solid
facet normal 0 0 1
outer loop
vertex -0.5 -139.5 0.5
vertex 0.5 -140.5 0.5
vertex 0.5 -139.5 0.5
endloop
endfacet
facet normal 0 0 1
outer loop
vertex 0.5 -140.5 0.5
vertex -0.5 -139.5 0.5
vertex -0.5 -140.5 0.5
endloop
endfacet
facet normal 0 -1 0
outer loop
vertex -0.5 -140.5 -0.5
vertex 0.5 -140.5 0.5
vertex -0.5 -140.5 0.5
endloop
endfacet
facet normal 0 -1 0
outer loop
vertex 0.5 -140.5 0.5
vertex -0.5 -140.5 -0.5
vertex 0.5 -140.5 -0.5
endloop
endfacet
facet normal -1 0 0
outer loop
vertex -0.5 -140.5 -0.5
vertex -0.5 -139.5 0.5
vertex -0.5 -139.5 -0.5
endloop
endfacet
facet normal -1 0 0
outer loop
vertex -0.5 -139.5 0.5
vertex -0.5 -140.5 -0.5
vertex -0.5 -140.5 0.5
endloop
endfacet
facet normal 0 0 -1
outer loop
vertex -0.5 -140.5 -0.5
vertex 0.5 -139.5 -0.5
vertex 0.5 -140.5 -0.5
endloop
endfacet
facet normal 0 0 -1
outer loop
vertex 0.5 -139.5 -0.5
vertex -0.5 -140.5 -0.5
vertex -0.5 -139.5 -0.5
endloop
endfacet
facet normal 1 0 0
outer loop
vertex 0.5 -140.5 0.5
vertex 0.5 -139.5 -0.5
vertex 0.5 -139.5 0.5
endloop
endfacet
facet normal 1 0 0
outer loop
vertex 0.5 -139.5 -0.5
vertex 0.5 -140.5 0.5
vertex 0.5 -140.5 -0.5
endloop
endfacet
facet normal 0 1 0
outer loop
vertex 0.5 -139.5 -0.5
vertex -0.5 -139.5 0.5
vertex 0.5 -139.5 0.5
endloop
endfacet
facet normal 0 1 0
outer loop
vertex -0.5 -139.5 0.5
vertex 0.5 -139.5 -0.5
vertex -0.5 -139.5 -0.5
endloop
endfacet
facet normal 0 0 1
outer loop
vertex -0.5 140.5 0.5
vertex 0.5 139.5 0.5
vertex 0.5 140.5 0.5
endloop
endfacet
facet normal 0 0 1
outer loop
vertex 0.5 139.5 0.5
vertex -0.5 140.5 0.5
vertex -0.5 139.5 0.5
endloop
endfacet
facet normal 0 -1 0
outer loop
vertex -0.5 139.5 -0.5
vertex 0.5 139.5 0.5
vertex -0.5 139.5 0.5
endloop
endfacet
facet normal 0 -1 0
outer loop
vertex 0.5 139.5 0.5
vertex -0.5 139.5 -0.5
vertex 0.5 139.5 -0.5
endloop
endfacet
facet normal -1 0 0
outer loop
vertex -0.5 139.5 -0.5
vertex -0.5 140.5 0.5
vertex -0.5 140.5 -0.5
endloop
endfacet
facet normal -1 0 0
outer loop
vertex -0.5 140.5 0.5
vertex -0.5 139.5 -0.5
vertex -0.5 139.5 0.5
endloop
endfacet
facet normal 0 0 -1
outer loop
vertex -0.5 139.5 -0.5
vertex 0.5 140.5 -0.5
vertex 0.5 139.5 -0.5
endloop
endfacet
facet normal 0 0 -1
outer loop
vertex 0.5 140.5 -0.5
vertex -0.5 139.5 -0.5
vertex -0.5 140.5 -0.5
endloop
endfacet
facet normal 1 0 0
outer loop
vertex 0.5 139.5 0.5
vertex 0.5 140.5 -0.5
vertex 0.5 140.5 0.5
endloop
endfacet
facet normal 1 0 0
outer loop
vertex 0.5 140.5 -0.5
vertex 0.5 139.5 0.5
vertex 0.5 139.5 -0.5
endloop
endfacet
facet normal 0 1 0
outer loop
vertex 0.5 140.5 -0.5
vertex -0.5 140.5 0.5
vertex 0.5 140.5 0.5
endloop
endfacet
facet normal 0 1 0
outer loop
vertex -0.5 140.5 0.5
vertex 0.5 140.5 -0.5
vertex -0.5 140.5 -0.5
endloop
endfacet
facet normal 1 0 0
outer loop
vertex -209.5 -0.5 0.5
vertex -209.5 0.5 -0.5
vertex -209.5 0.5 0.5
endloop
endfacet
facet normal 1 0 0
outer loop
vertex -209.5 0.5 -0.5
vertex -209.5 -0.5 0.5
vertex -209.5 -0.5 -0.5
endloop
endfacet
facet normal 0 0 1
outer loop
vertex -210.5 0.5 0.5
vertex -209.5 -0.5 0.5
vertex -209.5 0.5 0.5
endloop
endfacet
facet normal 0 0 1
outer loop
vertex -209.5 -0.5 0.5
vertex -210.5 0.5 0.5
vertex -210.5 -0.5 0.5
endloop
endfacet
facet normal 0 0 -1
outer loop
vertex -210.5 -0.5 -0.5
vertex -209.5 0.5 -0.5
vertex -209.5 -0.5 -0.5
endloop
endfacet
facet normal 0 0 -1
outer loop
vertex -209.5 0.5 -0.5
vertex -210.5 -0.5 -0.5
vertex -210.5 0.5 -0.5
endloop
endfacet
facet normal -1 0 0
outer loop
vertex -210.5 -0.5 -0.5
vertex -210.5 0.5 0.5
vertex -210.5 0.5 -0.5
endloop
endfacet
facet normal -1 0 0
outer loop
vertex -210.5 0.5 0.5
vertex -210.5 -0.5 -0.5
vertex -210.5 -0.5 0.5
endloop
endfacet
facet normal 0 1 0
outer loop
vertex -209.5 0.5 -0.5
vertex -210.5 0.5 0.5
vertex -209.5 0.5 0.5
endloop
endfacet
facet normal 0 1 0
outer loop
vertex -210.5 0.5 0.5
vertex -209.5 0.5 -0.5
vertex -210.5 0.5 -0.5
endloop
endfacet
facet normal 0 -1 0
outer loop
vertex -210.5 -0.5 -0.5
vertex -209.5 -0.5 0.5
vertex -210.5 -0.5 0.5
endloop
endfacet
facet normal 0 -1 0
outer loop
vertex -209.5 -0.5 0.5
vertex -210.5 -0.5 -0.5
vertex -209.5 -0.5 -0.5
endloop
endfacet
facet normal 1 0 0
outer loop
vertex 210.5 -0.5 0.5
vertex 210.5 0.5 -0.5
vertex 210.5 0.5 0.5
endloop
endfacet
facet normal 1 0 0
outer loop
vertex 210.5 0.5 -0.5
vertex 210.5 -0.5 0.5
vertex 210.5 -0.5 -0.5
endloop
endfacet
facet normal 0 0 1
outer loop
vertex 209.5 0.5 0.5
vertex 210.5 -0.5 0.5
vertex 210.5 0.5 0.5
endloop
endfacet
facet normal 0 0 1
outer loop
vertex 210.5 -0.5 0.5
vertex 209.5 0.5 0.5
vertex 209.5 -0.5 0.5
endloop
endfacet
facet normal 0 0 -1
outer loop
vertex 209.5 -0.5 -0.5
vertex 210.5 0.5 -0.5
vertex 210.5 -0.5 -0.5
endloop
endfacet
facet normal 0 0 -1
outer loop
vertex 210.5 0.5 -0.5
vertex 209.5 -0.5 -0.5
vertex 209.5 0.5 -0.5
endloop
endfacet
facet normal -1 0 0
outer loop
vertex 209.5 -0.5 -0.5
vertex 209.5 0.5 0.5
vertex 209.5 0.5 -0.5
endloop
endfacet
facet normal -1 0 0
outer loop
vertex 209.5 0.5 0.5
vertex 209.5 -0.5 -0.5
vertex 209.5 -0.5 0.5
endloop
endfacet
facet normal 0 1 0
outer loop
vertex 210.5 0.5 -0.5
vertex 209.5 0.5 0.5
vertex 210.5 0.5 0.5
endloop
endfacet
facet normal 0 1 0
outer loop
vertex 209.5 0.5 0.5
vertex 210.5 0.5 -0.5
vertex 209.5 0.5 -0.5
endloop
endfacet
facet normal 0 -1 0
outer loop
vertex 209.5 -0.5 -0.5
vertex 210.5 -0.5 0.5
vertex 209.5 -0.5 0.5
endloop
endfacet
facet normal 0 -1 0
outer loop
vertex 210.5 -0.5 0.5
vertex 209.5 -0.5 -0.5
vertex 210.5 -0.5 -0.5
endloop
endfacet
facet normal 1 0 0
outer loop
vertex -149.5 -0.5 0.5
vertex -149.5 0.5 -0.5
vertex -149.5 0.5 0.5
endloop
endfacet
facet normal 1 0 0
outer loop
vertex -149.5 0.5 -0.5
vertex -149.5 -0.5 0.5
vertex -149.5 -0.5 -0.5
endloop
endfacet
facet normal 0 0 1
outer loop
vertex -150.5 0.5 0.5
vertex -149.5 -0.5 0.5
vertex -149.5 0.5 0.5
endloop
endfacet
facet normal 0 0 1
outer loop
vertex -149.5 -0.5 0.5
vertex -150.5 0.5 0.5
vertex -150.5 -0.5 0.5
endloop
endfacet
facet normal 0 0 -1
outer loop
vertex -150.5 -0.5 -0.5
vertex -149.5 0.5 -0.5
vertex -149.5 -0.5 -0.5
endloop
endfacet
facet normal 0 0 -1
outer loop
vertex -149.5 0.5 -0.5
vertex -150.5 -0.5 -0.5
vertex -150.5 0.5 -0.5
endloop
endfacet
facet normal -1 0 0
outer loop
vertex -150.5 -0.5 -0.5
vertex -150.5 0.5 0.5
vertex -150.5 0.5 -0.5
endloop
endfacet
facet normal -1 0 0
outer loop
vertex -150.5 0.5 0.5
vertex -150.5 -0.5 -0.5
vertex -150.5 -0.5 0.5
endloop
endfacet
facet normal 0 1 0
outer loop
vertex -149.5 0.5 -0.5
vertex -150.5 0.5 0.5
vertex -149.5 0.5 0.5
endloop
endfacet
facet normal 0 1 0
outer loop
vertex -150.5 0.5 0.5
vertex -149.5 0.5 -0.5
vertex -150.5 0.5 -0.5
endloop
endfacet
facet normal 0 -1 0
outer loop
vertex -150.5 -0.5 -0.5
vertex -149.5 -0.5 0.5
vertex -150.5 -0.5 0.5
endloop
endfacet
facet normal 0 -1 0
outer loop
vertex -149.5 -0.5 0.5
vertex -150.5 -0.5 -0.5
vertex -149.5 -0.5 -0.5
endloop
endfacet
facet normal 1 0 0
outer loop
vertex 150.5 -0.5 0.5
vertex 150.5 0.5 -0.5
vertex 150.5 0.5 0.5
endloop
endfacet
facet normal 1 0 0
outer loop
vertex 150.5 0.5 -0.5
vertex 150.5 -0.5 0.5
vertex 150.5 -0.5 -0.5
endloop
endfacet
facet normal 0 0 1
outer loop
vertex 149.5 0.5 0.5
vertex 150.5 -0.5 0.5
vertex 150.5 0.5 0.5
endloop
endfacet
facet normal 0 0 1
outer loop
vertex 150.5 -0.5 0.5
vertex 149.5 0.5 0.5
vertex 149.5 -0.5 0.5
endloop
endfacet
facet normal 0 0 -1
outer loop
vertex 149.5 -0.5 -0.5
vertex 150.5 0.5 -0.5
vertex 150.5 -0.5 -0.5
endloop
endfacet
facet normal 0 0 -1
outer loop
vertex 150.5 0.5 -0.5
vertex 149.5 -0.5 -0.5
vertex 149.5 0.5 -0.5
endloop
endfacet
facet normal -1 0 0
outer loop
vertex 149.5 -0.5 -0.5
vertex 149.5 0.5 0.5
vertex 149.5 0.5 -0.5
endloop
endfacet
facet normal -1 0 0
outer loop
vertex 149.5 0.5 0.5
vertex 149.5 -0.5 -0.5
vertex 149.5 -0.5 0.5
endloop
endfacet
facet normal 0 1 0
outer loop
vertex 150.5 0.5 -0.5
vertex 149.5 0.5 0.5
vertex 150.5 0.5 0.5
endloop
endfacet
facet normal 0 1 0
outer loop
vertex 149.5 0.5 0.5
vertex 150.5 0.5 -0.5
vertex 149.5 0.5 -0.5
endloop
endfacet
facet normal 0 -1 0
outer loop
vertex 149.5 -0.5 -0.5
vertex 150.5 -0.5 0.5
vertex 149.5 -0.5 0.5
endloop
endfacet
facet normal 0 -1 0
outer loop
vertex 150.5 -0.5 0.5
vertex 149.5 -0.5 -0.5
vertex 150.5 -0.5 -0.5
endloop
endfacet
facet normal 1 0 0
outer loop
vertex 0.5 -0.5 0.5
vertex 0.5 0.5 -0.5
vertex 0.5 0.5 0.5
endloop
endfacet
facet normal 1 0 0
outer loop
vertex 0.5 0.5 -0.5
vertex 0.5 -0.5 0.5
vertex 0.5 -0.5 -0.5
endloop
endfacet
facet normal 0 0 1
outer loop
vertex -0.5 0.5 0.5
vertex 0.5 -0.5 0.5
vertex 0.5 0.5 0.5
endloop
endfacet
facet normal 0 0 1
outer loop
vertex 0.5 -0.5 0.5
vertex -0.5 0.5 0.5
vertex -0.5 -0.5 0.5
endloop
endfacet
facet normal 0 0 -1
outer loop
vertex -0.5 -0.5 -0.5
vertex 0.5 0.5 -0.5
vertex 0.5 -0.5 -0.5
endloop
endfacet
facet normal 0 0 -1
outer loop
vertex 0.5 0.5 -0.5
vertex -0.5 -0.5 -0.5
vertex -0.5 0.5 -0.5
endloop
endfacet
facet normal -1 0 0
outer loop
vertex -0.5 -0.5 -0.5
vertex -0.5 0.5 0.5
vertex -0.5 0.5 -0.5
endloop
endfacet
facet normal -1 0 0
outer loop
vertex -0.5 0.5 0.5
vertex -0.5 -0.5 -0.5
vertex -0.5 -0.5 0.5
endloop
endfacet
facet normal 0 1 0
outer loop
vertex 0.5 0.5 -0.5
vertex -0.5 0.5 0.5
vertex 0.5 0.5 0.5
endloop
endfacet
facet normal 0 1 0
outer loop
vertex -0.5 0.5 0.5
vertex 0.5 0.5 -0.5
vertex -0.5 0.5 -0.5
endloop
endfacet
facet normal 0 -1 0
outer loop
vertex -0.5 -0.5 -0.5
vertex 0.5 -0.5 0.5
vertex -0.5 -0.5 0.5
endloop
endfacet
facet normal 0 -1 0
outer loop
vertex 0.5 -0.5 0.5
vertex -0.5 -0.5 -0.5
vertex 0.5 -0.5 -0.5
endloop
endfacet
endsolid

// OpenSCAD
// file: dimensions.scad
plate_thickness = 1;

seat_depth = 280;

seat_mount_centres = [300, 200];
seat_mount_hole_diameter = 8;
// file: ../../dimensions.scad
box_section_outer = 25;
plate_thickness = 1;

outer = 210;
inner = 120;
// file: ../../parts/box_section.scad
module BoxSection(name, col, outer, length, center)
{
  echo(name, col, "outer=", outer, "length=", length);

  translate(center ? [0, 0, 0] : -[outer[0]/2, 0, outer[1]/2])
  {
    color(col)
    {
      cube([outer[0], length, outer[1]], center=center);
    }
  }
}
// main file
use <../../parts/box_section.scad>;

include <../../dimensions.scad>;

include <dimensions.scad>;

module SeatMountAssembly()
{
  difference()
  {
    union()
    {
      for (y = [-seat_depth/2, seat_depth/2])
      {
        translate([0, y, 0])
        {
          rotate([0, 0, 90])
          {
            BoxSection(
                name="section_a",
                col="darkgreen",
                outer=box_section_outer,
                length=outer * 2 + box_section_outer[0],
                center=true);
          }
        }
      }

      for (x = [-outer, outer, -seat_mount_centres[0]/2, seat_mount_centres[0]/2])
      {
        translate([x, 0, 0])
        {
          BoxSection(
              name="section_b",
              col="blue",
              outer=box_section_outer,
              length=seat_depth - box_section_outer[0],
              center=true);
        }
      }

      translate([0, 0, (box_section_outer[1] + plate_thickness) / 2])
      {
        color("grey")
        {
          cube([outer * 2 + box_section_outer[0], 280 + box_section_outer[0], plate_thickness], center=true);
        }
      }
    }

    for (x = [-seat_mount_centres[0]/2, seat_mount_centres[0]/2])
    {
      for (y = [-seat_mount_centres[1]/2, seat_mount_centres[1]/2])
      {
        translate([x, y])
        {
          cylinder(h=100, d=seat_mount_hole_diameter, center=true);
        }
      }
    }
  }
}

SeatMountAssembly();
